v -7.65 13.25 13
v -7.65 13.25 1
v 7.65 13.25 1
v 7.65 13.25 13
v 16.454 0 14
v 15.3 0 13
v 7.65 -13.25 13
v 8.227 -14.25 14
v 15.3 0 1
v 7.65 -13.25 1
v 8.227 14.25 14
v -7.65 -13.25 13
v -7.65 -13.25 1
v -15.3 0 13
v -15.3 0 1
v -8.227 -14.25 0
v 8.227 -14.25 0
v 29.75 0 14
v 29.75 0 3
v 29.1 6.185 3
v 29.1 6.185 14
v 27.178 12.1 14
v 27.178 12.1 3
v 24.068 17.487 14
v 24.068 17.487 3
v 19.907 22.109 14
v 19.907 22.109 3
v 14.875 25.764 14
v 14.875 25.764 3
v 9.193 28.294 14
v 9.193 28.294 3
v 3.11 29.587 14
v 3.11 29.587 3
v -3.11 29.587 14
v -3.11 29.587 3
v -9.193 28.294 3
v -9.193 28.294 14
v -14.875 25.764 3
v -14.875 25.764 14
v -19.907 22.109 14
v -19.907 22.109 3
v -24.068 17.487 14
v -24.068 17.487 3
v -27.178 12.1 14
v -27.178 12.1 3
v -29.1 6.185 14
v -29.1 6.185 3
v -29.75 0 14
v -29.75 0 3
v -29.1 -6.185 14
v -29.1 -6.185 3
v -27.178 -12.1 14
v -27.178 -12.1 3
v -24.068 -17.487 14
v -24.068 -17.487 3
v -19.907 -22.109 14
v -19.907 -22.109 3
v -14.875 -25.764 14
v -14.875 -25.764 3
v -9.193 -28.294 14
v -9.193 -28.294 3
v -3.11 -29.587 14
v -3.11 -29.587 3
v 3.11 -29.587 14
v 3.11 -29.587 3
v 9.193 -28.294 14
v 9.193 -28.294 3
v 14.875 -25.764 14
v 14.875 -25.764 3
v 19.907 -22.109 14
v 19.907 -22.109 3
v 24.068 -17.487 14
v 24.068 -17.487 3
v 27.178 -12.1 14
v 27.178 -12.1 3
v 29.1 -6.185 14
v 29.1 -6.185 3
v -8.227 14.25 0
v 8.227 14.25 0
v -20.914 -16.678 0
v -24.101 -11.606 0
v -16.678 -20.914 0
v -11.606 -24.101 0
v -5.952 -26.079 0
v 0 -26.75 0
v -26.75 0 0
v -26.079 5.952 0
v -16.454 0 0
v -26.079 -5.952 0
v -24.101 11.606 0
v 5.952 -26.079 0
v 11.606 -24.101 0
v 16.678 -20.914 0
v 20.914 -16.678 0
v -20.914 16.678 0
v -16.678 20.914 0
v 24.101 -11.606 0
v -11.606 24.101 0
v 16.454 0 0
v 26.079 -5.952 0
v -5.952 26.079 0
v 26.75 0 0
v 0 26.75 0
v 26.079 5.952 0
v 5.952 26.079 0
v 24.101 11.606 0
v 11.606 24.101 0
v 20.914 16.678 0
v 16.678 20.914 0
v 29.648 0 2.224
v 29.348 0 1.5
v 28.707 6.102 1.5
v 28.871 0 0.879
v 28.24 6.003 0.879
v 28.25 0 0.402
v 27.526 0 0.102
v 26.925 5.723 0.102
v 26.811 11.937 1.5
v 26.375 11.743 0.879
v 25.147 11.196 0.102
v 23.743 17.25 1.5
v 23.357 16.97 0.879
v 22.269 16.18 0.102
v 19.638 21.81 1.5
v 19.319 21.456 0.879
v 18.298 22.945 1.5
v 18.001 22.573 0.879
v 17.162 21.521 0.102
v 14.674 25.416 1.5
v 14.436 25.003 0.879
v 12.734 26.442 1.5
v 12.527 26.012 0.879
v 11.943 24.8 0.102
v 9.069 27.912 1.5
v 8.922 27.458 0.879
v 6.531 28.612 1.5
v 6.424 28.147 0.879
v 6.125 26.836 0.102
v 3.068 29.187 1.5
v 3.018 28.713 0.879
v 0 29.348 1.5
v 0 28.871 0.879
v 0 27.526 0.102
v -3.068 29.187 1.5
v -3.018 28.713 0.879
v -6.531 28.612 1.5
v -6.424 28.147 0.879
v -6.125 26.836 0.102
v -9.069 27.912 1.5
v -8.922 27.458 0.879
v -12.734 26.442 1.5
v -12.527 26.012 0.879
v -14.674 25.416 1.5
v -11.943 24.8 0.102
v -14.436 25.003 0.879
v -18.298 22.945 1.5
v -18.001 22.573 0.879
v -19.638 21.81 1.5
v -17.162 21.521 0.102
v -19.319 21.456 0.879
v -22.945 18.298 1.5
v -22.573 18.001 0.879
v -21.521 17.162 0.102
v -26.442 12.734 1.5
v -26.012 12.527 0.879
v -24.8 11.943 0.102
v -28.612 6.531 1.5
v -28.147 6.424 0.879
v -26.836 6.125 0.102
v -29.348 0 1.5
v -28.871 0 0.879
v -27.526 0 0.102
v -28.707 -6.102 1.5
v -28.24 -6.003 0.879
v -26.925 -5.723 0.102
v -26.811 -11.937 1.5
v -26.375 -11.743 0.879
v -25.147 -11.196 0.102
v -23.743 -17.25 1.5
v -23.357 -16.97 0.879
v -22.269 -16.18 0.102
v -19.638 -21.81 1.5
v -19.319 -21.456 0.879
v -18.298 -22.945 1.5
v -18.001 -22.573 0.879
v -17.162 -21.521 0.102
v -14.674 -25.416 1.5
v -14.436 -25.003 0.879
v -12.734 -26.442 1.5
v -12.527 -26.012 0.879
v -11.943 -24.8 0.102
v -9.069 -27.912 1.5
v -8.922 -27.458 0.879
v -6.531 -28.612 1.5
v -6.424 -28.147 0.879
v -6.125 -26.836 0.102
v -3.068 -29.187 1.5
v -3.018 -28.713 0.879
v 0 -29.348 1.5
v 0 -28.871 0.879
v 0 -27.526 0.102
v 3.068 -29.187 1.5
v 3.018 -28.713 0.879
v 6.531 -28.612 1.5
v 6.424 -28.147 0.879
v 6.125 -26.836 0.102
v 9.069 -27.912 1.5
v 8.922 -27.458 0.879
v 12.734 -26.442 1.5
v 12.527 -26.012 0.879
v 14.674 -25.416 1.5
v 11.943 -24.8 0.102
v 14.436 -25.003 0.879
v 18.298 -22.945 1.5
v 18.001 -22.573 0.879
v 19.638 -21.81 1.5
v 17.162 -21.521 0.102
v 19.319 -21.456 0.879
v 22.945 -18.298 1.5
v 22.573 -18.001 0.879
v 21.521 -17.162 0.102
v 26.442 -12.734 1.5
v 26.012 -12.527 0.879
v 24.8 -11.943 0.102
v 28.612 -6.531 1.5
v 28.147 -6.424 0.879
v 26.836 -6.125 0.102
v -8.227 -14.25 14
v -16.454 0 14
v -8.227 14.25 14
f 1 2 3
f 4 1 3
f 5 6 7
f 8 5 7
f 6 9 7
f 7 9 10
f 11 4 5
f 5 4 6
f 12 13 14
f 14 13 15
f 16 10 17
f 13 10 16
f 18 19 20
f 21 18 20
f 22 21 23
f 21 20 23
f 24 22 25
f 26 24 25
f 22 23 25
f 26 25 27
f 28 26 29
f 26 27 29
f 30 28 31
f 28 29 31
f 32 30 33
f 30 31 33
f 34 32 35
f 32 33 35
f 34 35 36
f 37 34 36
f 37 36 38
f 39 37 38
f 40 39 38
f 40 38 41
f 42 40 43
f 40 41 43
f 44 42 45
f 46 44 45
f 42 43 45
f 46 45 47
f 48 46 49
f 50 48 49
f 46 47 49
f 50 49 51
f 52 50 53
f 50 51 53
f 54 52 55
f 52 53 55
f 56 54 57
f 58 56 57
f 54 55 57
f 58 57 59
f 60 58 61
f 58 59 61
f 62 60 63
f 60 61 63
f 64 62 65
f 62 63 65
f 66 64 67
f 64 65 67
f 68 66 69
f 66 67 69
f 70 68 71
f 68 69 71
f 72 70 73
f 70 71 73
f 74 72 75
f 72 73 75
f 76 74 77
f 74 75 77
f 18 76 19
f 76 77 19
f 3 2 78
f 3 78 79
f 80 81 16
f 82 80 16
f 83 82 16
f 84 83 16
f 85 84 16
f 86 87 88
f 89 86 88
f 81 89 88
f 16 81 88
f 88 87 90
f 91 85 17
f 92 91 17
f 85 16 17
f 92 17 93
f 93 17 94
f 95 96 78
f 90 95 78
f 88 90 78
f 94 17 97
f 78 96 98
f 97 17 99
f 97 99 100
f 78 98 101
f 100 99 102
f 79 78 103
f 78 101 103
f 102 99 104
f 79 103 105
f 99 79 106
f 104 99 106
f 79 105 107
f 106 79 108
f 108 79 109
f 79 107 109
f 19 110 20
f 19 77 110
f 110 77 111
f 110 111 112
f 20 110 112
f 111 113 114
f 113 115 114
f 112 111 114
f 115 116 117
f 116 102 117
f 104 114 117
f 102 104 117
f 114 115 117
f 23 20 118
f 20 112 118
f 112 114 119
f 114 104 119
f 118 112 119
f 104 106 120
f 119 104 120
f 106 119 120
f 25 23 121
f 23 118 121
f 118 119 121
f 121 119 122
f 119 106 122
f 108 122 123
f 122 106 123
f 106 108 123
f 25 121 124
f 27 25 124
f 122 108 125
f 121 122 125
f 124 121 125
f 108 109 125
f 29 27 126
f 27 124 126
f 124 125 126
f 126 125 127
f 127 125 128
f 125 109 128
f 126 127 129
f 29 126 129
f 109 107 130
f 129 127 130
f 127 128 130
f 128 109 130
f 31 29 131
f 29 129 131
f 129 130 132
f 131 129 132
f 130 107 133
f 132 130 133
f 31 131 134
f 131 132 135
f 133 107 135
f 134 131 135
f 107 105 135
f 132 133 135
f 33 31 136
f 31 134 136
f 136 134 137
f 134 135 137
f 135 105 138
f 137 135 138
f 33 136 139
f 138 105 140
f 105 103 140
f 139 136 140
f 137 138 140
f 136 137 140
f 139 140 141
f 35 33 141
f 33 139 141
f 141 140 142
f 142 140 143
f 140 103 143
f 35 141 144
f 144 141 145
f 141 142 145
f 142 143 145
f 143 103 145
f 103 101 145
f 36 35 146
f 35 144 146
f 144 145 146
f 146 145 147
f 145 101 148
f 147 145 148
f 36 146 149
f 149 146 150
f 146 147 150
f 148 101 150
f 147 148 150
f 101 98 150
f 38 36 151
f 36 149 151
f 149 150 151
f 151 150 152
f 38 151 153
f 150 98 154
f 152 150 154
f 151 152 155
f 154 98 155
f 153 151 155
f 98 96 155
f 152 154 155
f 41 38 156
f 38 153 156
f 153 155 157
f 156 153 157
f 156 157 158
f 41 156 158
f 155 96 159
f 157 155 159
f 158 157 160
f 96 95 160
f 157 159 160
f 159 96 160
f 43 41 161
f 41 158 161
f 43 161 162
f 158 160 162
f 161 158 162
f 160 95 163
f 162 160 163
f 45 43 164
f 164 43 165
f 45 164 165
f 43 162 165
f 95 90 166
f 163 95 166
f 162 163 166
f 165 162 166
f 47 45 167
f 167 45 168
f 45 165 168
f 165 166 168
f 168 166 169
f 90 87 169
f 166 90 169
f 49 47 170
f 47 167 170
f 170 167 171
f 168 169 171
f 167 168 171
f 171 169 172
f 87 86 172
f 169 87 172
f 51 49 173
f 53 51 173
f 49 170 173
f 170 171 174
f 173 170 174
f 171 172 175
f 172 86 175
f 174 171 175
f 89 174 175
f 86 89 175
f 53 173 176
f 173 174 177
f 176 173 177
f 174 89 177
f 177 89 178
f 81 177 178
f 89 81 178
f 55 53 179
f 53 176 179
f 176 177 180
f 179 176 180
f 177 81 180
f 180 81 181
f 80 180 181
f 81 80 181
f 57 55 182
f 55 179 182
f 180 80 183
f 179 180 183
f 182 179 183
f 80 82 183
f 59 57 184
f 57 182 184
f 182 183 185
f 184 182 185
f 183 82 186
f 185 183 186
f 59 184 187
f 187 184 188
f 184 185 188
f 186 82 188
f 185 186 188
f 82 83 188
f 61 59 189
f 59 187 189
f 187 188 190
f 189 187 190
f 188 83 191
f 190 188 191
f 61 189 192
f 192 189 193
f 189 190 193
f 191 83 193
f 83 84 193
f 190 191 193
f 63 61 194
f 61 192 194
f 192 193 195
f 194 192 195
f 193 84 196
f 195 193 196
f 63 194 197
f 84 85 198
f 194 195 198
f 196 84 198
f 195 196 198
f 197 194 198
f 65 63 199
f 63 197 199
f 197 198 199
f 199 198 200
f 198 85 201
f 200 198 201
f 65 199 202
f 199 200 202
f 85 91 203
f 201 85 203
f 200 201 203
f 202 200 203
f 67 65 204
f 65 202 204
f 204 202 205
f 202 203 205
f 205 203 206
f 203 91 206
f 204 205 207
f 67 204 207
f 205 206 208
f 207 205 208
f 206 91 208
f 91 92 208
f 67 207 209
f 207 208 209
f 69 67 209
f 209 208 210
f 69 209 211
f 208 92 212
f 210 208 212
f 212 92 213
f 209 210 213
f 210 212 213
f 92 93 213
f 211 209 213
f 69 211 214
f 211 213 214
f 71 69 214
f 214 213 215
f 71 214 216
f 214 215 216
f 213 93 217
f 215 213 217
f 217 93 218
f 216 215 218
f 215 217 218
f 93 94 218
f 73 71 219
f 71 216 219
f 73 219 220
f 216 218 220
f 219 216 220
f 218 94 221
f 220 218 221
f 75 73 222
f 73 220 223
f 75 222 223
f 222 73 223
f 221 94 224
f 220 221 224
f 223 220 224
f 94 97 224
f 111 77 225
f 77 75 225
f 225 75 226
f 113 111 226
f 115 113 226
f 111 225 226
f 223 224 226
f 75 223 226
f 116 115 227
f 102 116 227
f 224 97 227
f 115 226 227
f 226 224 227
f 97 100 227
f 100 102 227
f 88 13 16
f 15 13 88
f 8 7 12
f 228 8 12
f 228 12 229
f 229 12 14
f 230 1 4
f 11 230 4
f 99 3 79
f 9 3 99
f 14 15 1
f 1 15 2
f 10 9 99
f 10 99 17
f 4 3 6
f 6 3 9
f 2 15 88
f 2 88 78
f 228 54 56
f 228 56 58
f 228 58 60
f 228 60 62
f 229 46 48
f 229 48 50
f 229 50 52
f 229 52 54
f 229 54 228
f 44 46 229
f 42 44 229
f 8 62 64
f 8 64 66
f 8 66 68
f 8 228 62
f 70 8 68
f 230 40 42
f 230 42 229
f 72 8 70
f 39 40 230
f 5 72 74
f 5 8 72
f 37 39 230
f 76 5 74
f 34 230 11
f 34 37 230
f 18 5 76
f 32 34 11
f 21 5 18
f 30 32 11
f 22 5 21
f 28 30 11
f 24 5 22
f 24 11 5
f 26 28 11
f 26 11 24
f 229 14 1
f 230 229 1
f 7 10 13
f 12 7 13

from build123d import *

# Parameters (mm, degrees)
F0_R     = 29.75
F1_DEPTH = 14
F2_R     = 3
F3_SIZE  = 1
F4_SIZE  = 1


with BuildPart() as f1:
    # F0 (on Top) → F1 (new body)
    with BuildSketch(Plane.XY):
        Circle(F0_R)
        Polygon((15.299782, 0), (7.649891, -13.25), (-7.649891, -13.25), (-15.299782, 0), (-7.649891, 13.25), (7.649891, 13.25), align=None, mode=Mode.SUBTRACT)
    extrude(amount=F1_DEPTH)

    # F2
    f2_edges = [f1.edges().sort_by_distance(p)[0] for p in [
        (-29.75, 0, 0),
    ]]
    fillet(f2_edges, radius=F2_R)

    # F3
    f3_edges = [f1.edges().sort_by_distance(p)[0] for p in [
        (-11.474837, -6.625, 14),
        (-11.474837, 6.625, 14),
        (0, 13.25, 14),
        (11.474837, -6.625, 14),
        (11.474837, 6.625, 0),
        (0, -13.25, 14),
        (11.474837, 6.625, 14),
    ]]
    chamfer(f3_edges, length=F3_SIZE)

    # F4
    f4_edges = [f1.edges().sort_by_distance(p)[0] for p in [
        (11.474837, -6.625, 0),
        (0, -13.25, 0),
        (-11.474837, -6.625, 0),
        (-11.474837, 6.625, 0),
        (0, 13.25, 0),
    ]]
    chamfer(f4_edges, length=F4_SIZE)


solid = f1.part
